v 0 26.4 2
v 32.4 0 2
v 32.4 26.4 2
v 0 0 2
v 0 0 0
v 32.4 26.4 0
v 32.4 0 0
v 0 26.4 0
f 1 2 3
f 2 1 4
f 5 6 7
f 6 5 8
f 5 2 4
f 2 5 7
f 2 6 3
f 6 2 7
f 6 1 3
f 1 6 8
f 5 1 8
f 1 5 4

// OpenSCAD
//
//
//	Customizable Modular Building Roof
//	Steve Medwin
//	April 21, 2014
//
//

// preview[view:south, tilt:top]

//
// CUSTOMIZING
//
// Number of horizontal windows in front
horizontal_windows_front=3; //[1:10]
Nfront=horizontal_windows_front;
// Number of horizontal windows on sides
horizontal_windows_side=2; //[1:10]
Nside=horizontal_windows_side;

//
// REMAINING PARAMETERS
//
// windows
Xinit=5*1; // Distance from left edge to first window
Yinit=6*1; //5 Distance from bottom to first window row
Xspace=10*1; // Distance from left edge of window to next left edge of window
Yspace=15.5*1; // Distance from bottom of window row to next row
Zbase=2*1; // Thickness of wall
Xwin=6.4*1; // Width of window

Xfront=Xinit*2+Xspace*(Nfront-1)+Xwin-2*Zbase; // Width of front wall - side wall thicknesses
Xside=Xinit*2+Xspace*(Nside-1)+Xwin; // Width of front wall

// make roof insert
cube([Xfront,Xside,Zbase]);
echo(Xfront,Xside);
